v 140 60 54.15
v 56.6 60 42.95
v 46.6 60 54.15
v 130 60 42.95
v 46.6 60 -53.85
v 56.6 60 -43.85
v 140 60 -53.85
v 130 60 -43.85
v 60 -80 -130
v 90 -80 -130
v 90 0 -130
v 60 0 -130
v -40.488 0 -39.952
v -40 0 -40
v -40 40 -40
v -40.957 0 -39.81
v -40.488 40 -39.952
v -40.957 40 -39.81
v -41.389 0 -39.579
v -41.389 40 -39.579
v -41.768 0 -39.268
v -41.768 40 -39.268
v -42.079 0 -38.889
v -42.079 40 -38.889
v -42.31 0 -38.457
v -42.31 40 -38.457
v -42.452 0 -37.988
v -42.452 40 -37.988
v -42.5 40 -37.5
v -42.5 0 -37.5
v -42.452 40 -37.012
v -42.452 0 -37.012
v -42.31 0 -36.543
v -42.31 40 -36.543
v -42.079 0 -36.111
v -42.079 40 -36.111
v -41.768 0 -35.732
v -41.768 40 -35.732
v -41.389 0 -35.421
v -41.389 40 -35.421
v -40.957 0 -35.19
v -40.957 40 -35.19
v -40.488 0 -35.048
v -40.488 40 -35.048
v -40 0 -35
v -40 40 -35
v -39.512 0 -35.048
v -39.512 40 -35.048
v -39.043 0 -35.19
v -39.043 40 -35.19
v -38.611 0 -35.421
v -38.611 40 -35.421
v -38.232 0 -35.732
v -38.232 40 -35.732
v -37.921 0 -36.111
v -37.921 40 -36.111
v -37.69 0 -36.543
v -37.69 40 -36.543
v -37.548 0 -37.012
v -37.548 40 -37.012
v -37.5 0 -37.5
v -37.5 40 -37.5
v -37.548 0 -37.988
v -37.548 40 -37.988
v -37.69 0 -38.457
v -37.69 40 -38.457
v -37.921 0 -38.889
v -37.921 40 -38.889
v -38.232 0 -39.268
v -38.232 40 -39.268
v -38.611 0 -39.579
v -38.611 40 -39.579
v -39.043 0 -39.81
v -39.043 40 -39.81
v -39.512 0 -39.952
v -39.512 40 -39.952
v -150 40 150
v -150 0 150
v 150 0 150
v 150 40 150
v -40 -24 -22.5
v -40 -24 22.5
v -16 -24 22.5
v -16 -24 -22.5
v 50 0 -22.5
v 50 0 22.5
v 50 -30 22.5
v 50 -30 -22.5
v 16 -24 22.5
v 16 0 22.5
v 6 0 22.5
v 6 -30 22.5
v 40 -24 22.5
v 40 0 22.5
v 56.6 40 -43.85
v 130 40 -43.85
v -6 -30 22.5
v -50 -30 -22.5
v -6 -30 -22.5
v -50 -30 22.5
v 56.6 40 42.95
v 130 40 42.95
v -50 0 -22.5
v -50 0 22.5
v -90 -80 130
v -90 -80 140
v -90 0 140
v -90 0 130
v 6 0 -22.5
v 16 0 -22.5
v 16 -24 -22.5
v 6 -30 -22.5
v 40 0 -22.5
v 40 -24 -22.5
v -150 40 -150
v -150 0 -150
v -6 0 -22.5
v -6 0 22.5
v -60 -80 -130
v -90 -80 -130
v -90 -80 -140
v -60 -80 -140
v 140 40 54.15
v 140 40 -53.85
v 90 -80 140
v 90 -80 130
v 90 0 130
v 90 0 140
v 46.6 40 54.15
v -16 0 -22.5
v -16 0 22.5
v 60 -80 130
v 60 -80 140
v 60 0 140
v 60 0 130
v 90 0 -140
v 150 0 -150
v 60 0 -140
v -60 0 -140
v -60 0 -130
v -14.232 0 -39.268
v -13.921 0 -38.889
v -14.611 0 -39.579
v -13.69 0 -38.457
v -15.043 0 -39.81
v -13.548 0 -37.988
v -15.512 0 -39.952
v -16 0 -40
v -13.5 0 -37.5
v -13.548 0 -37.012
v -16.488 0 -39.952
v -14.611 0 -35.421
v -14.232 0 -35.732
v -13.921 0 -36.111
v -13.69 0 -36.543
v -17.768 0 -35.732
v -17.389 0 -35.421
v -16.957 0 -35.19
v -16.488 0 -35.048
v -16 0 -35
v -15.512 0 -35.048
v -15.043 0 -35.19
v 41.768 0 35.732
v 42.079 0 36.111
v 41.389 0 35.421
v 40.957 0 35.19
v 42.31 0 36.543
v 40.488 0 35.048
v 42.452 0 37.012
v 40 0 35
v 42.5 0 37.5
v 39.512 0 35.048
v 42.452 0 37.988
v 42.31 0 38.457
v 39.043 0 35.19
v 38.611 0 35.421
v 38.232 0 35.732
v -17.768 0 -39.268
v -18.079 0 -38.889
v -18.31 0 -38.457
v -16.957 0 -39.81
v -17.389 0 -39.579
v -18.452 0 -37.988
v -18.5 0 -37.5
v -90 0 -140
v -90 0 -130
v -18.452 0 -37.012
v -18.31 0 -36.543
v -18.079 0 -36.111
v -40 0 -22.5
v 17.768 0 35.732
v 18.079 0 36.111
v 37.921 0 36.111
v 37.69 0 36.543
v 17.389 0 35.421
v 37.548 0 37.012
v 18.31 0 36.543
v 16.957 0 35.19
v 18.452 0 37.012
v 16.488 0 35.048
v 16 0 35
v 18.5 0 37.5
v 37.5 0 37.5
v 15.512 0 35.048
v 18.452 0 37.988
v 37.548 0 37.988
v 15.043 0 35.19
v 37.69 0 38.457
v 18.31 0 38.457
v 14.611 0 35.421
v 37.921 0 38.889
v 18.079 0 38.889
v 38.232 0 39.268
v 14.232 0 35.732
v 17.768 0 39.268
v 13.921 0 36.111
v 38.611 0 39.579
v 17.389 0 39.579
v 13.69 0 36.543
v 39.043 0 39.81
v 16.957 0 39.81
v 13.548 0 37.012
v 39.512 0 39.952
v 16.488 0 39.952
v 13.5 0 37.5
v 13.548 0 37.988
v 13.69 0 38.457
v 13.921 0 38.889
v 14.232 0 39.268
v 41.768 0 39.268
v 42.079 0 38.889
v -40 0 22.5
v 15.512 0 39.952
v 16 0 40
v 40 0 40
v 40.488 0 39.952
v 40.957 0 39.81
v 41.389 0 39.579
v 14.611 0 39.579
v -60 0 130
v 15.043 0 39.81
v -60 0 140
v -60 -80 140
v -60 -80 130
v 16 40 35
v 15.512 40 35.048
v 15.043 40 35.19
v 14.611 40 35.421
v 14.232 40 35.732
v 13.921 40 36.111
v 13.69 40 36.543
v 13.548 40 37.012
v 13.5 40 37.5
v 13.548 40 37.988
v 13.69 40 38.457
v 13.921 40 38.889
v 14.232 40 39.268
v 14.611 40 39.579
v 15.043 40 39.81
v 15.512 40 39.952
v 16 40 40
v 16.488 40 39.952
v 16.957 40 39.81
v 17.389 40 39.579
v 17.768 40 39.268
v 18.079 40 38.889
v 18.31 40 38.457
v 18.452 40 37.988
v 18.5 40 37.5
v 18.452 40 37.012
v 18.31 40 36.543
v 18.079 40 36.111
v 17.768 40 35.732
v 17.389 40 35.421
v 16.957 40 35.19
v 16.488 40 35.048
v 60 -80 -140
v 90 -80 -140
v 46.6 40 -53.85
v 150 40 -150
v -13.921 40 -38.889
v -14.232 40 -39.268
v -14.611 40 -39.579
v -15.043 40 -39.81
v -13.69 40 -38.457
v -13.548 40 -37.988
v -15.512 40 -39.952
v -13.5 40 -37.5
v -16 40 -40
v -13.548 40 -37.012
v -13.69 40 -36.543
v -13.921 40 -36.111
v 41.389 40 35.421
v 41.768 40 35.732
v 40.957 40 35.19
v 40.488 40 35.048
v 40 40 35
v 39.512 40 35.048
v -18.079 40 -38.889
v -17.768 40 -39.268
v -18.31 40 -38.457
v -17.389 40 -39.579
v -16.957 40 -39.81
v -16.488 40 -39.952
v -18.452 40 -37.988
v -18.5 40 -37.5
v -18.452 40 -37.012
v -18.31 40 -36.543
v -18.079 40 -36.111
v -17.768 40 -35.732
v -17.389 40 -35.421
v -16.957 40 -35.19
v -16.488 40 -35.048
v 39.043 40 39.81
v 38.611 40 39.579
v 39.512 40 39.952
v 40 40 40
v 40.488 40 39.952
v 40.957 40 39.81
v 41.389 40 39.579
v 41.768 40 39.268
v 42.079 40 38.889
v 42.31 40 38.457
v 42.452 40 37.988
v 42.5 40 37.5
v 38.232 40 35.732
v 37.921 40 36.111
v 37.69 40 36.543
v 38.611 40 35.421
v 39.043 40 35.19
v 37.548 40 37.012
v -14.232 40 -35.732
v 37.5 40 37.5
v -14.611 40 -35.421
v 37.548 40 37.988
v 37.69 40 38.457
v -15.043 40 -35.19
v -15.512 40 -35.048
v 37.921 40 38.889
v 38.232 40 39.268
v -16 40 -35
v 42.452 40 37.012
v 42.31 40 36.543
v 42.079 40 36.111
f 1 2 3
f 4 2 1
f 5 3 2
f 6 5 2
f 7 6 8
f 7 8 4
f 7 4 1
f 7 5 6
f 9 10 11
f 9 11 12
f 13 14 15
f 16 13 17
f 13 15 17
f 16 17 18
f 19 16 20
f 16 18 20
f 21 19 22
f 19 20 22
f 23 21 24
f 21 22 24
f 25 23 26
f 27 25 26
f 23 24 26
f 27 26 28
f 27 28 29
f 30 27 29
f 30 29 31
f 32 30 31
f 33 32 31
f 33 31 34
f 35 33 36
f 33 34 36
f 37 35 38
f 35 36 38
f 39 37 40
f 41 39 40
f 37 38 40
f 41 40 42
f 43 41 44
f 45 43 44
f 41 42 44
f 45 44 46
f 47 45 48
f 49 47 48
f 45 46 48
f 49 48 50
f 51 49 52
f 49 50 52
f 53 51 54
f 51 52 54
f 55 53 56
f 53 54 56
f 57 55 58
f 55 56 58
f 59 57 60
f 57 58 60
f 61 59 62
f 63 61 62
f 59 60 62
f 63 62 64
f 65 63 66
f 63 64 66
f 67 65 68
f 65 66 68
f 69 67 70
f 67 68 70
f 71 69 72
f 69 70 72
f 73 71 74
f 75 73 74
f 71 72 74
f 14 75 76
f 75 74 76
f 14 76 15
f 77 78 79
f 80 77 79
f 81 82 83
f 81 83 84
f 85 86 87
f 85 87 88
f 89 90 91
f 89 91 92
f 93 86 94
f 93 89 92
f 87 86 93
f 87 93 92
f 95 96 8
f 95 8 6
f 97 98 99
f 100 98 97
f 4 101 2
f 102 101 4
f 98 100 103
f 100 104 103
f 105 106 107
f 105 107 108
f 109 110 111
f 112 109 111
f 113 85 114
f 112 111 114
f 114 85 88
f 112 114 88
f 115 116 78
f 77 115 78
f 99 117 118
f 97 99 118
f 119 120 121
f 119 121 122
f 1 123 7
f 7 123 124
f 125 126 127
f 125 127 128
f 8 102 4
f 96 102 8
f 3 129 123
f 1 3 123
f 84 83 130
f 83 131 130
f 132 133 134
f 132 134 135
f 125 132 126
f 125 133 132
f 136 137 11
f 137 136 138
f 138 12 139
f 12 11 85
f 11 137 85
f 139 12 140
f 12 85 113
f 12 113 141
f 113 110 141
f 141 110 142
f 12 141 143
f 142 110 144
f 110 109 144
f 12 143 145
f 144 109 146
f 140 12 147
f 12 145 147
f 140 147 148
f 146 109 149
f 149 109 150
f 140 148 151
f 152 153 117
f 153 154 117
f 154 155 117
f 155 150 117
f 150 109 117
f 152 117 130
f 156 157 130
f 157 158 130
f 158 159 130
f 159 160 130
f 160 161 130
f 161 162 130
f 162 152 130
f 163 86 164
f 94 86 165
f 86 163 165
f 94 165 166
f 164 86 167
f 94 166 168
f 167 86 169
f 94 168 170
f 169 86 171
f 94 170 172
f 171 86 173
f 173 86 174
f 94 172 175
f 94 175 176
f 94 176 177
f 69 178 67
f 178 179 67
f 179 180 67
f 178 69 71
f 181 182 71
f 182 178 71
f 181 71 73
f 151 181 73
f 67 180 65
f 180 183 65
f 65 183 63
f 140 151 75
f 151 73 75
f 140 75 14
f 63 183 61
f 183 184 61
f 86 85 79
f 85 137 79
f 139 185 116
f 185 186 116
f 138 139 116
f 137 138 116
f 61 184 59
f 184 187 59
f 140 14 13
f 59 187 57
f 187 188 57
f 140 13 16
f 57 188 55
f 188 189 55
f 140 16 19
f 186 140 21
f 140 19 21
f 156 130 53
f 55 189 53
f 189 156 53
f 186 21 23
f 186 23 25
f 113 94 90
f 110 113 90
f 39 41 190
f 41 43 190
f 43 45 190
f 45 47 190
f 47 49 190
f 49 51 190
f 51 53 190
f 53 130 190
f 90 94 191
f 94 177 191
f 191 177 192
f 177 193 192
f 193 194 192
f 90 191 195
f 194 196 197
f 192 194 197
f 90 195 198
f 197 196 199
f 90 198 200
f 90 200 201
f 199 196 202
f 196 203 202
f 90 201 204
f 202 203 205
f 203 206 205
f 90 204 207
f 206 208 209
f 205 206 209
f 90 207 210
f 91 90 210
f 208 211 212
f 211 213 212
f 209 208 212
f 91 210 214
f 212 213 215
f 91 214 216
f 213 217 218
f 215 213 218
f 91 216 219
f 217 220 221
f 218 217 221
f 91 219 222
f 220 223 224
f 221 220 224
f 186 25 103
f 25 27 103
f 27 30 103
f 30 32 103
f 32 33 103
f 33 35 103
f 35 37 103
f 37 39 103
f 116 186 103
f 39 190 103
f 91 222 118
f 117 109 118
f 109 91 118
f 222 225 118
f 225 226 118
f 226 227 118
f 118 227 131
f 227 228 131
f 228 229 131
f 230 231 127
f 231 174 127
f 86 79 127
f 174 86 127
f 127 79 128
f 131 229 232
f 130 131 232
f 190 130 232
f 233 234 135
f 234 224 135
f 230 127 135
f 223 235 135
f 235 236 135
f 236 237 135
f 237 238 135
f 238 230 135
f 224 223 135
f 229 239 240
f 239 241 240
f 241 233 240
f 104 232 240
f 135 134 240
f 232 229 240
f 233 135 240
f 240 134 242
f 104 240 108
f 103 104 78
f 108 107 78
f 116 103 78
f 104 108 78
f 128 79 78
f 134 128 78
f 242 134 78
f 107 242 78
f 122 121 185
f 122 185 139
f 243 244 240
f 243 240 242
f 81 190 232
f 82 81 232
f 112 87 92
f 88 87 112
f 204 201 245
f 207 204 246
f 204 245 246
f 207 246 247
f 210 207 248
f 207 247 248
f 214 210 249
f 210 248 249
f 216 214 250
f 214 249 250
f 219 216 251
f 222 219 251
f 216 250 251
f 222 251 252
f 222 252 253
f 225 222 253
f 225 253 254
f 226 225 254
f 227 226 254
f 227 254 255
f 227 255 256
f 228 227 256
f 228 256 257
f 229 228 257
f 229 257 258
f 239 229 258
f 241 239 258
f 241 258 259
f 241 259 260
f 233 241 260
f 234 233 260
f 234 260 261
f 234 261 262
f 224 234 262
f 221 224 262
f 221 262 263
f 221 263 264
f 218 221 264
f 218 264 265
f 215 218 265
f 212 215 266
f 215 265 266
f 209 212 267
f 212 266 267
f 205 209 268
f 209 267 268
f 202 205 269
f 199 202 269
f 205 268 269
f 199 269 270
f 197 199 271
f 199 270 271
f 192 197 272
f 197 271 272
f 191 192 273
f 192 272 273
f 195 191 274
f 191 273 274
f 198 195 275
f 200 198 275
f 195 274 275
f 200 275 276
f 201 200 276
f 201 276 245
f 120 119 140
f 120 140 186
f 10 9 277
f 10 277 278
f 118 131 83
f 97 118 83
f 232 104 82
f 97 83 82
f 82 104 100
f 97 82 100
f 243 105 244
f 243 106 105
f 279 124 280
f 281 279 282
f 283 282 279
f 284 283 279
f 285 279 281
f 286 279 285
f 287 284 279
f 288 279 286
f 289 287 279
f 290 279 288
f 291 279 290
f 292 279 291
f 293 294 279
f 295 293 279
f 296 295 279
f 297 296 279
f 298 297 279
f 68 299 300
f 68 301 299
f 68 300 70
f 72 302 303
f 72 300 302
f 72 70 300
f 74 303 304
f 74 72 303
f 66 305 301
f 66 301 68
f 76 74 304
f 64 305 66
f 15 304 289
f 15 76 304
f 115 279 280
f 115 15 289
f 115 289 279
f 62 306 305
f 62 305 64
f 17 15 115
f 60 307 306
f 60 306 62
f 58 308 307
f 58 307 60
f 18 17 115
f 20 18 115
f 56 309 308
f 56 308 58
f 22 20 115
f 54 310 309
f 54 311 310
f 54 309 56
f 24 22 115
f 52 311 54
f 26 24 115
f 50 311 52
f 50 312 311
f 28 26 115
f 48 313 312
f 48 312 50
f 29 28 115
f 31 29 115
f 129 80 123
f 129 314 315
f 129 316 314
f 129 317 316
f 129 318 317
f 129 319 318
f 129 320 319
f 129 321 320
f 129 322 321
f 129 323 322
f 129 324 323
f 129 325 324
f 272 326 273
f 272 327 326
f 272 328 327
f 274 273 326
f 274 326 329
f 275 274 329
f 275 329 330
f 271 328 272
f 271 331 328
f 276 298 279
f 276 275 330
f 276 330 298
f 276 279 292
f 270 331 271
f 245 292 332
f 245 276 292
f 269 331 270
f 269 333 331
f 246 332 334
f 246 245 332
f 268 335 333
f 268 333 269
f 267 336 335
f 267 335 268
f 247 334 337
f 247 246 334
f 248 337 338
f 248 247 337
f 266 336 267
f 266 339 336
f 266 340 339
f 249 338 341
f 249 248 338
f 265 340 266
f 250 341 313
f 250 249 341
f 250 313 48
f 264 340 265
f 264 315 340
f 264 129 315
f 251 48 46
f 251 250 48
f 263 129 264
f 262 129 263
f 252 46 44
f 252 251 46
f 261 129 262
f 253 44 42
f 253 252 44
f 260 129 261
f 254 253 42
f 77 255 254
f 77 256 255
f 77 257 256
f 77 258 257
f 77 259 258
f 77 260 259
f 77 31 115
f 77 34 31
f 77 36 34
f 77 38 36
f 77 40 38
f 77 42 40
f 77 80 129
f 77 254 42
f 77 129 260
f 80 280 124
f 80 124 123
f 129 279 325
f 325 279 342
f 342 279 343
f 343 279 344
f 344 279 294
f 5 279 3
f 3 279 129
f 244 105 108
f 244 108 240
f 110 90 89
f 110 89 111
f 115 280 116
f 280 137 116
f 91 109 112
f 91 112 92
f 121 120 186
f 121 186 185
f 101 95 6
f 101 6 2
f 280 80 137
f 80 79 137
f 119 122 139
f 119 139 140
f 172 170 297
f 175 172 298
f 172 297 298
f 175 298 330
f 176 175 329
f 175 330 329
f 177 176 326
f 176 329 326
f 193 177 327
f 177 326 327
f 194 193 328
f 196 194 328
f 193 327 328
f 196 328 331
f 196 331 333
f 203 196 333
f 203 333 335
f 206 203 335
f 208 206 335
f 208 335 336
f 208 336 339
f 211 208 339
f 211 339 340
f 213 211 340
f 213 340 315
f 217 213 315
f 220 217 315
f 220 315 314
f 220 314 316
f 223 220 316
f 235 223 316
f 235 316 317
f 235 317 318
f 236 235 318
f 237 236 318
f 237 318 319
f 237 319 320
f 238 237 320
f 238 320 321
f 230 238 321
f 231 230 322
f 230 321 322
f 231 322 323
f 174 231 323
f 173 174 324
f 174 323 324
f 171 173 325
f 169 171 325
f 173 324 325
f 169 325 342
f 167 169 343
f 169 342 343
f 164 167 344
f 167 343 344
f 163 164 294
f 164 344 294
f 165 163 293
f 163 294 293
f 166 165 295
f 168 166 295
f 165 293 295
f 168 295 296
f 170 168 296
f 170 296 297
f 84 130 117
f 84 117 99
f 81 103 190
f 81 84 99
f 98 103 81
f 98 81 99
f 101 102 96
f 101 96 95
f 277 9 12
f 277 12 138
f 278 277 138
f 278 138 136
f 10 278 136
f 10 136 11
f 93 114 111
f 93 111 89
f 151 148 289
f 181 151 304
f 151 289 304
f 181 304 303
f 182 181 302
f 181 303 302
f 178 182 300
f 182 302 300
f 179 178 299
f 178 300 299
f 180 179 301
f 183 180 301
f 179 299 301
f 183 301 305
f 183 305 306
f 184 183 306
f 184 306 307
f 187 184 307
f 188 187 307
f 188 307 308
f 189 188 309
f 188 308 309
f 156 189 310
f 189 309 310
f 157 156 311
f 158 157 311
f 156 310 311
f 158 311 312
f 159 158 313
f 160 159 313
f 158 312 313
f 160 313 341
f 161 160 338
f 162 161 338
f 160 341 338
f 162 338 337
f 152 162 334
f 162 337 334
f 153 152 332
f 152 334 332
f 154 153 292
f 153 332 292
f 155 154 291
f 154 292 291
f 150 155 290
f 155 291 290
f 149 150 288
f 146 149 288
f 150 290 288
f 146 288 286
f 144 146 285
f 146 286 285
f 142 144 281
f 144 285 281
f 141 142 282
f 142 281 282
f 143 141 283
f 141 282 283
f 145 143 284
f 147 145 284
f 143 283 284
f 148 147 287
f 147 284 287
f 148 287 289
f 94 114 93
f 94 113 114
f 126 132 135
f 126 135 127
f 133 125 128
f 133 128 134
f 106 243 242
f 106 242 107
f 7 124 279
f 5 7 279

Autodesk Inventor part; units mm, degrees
ref_plane "YZ Plane" through (0, 0, 0) normal (1, 0, 0) x (0, 1, 0)
ref_plane "XZ Plane" through (0, 0, 0) normal (0, 1, 0) x (-1, 0, 0)
ref_plane "XY Plane" through (0, 0, 0) normal (0, 0, 1) x (1, 0, 0)
sketch "Sketch1" plane through (0, 0, 0) normal (0, 1, 0) x (-1, 0, 0)
  line L0 (-150, -150) -> (150, -150)
  line L1 (150, -150) -> (150, 150)
  line L2 (150, 150) -> (-150, 150)
  line L3 (-150, 150) -> (-150, -150)
  line L4 (-150, -150) -> (150, 150) construction
  line L5 (150, -150) -> (-150, 150) construction
  point P0 (0, 0)
extrude "Extrusion1" add sketch "Sketch1" along normal blind 40
sketch "Sketch4" plane through (0, 0, 0) normal (0, -1, 0) x (1, 0, 0)
  line L0 (150, -150) -> (-150, -150) projected
  line L1 (0, -150) -> (150, -150)
  line L2 (60, -130) -> (90, -130)
  line L3 (90, -130) -> (90, -140)
  line L4 (90, -140) -> (60, -140)
  line L5 (60, -140) -> (60, -130)
  line L6 (60, -130) -> (90, -140) construction
  line L7 (90, -130) -> (60, -140) construction
  line L8 (-60, -130) -> (-90, -130)
  line L9 (-90, -130) -> (-90, -140)
  line L10 (-90, -140) -> (-60, -140)
  line L11 (-60, -140) -> (-60, -130)
  line L12 (150, 150) -> (150, -150) projected
  line L13 (60, 130) -> (90, 130)
  line L14 (90, 130) -> (90, 140)
  line L15 (90, 140) -> (60, 140)
  line L16 (60, 140) -> (60, 130)
  line L17 (60, 130) -> (90, 140) construction
  line L18 (90, 130) -> (60, 140) construction
  line L19 (-60, 130) -> (-90, 130)
  line L20 (-60, 140) -> (-60, 130)
  line L21 (-90, 140) -> (-60, 140)
  line L22 (-90, 130) -> (-90, 140)
  point P0 (0, 0)
extrude "Extrusion3" add sketch "Sketch4" along normal blind 30
sketch "Sketch5" plane through (0, 0, 0) normal (0, -1, 0) x (1, 0, 0)
  line L0 (-40, 22.5) -> (-50, 22.5)
  line L1 (-50, 22.5) -> (-50, -22.5)
  line L2 (-50, -22.5) -> (-40, -22.5)
  line L3 (-40, -22.5) -> (-40, 22.5)
  line L4 (-40, 22.5) -> (-50, -22.5) construction
  line L5 (-50, 22.5) -> (-40, -22.5) construction
  line L6 (-16, -22.5) -> (-6, -22.5)
  line L7 (-6, -22.5) -> (-6, 22.5)
  line L8 (-6, 22.5) -> (-16, 22.5)
  line L9 (-16, 22.5) -> (-16, -22.5)
  line L10 (40, 22.5) -> (50, 22.5)
  line L11 (50, 22.5) -> (50, -22.5)
  line L12 (50, -22.5) -> (40, -22.5)
  line L13 (40, -22.5) -> (40, 22.5)
  line L14 (40, 22.5) -> (50, -22.5) construction
  line L15 (50, 22.5) -> (40, -22.5) construction
  line L16 (16, -22.5) -> (6, -22.5)
  line L17 (6, -22.5) -> (6, 22.5)
  line L18 (6, 22.5) -> (16, 22.5)
  line L19 (16, 22.5) -> (16, -22.5)
  point P0 (0, 0)
  point P1 (-45, 0)
  point P2 (45, 0)
extrude "Extrusion4" add sketch "Sketch5" along normal blind 30
sketch "Sketch6" plane through (40, 0, -22.5) normal (-1, 0, 0) x (0, 0, 1)
  line L0 (0, 0) -> (0, -30) projected
  line L1 (45, -30) -> (0, -30)
  line L2 (0, -30) -> (0, -24)
  line L3 (0, -24) -> (45, -24)
  line L4 (45, -24) -> (45, -30)
  point P0 (22.5, 0)
extrude "Extrusion5" add sketch "Sketch6" along normal blind 24
sketch "Sketch9" plane through (-40, 0, 22.5) normal (1, 0, 0) x (0, 0, -1)
  line L0 (0, 0) -> (0, -30) projected
  line L1 (45, -30) -> (0, -30)
  line L2 (0, -30) -> (0, -24)
  line L3 (0, -24) -> (45, -24)
  line L4 (45, -24) -> (45, -30)
  point P0 (22.5, 0)
extrude "Extrusion6" add sketch "Sketch9" along normal blind 24
sketch "Sketch12" plane through (0, 0, 0) normal (0, -1, 0) x (1, 0, 0)
  circle A0 centre (-40, -37.5) radius 2.5
  circle A1 centre (-16, -37.5) radius 2.5
  line L0 (0, 0) -> (11, 0)
  circle A2 centre (16, 37.5) radius 2.5
  circle A3 centre (40, 37.5) radius 2.5
hole "Hole1" at (-40, 0, -37.5) at (-16, 0, -37.5) at (16, 0, 37.5) at (40, 0, 37.5) direction (0, 1, 0) diameter 5 end through all
sketch "Sketch14" plane through (0, 40, 0) normal (0, 1, 0) x (1, 0, 0)
  line L0 (150, -150) -> (150, 150) projected
  line L1 (150, 0) -> (150, 34.3)
  line L2 (130, 33.8503) -> (130, 43.8503)
  line L3 (130, 43.8503) -> (56.6, 43.8503)
  line L4 (56.6, 43.8503) -> (56.6, -42.9497)
  line L5 (56.6, -42.9497) -> (130, -42.9497)
  line L6 (130, -42.9497) -> (130, 43.8503)
  line L7 (66.6, 43.8503) -> (56.6, 43.8503)
  line L8 (130, 53.8503) -> (140, 53.8503)
  line L9 (140, 53.8503) -> (46.6, 53.8503)
  line L10 (46.6, 53.8503) -> (46.6, -54.1497)
  line L11 (46.6, -54.1497) -> (140, -54.1497)
  line L12 (140, -54.1497) -> (140, 53.8503)
  point P0 (0, 0)
extrude "Extrusion10" add sketch "Sketch14" along normal blind 20
sketch "Sketch17" plane through (0, -30, 0) normal (0, -1, 0) x (1, 0, 0)
  line L0 (-90, 130) -> (-60, 130) projected
  line L1 (-60, 130) -> (-60, 140) projected
  line L2 (-60, 140) -> (-90, 140) projected
  line L3 (-90, 140) -> (-90, 130) projected
  point P0 (0, 0)
sketch "Sketch18" plane through (0, -30, 0) normal (0, -1, 0) x (1, 0, 0)
  line L0 (60, 130) -> (90, 130) projected
  line L1 (90, 130) -> (90, 140) projected
  line L2 (90, 140) -> (60, 140) projected
  line L3 (60, 140) -> (60, 130) projected
  point P0 (0, 0)
sketch "Sketch19" plane through (0, -30, 0) normal (0, -1, 0) x (1, 0, 0)
  line L0 (-60, -130) -> (-90, -130) projected
  line L1 (-90, -130) -> (-90, -140) projected
  line L2 (-90, -140) -> (-60, -140) projected
  line L3 (-60, -140) -> (-60, -130) projected
  point P0 (0, 0)
sketch "Sketch20" plane through (0, -30, 0) normal (0, -1, 0) x (1, 0, 0)
  line L0 (90, -130) -> (60, -130) projected
  line L1 (60, -130) -> (60, -140) projected
  line L2 (60, -140) -> (90, -140) projected
  line L3 (90, -140) -> (90, -130) projected
  point P0 (0, 0)
extrude "Extrusion11" add sketch "Sketch17" along normal blind 50
extrude "Extrusion12" add sketch "Sketch19" along normal blind 50
extrude "Extrusion13" add sketch "Sketch20" along normal blind 50
extrude "Extrusion14" add sketch "Sketch18" along normal blind 50
